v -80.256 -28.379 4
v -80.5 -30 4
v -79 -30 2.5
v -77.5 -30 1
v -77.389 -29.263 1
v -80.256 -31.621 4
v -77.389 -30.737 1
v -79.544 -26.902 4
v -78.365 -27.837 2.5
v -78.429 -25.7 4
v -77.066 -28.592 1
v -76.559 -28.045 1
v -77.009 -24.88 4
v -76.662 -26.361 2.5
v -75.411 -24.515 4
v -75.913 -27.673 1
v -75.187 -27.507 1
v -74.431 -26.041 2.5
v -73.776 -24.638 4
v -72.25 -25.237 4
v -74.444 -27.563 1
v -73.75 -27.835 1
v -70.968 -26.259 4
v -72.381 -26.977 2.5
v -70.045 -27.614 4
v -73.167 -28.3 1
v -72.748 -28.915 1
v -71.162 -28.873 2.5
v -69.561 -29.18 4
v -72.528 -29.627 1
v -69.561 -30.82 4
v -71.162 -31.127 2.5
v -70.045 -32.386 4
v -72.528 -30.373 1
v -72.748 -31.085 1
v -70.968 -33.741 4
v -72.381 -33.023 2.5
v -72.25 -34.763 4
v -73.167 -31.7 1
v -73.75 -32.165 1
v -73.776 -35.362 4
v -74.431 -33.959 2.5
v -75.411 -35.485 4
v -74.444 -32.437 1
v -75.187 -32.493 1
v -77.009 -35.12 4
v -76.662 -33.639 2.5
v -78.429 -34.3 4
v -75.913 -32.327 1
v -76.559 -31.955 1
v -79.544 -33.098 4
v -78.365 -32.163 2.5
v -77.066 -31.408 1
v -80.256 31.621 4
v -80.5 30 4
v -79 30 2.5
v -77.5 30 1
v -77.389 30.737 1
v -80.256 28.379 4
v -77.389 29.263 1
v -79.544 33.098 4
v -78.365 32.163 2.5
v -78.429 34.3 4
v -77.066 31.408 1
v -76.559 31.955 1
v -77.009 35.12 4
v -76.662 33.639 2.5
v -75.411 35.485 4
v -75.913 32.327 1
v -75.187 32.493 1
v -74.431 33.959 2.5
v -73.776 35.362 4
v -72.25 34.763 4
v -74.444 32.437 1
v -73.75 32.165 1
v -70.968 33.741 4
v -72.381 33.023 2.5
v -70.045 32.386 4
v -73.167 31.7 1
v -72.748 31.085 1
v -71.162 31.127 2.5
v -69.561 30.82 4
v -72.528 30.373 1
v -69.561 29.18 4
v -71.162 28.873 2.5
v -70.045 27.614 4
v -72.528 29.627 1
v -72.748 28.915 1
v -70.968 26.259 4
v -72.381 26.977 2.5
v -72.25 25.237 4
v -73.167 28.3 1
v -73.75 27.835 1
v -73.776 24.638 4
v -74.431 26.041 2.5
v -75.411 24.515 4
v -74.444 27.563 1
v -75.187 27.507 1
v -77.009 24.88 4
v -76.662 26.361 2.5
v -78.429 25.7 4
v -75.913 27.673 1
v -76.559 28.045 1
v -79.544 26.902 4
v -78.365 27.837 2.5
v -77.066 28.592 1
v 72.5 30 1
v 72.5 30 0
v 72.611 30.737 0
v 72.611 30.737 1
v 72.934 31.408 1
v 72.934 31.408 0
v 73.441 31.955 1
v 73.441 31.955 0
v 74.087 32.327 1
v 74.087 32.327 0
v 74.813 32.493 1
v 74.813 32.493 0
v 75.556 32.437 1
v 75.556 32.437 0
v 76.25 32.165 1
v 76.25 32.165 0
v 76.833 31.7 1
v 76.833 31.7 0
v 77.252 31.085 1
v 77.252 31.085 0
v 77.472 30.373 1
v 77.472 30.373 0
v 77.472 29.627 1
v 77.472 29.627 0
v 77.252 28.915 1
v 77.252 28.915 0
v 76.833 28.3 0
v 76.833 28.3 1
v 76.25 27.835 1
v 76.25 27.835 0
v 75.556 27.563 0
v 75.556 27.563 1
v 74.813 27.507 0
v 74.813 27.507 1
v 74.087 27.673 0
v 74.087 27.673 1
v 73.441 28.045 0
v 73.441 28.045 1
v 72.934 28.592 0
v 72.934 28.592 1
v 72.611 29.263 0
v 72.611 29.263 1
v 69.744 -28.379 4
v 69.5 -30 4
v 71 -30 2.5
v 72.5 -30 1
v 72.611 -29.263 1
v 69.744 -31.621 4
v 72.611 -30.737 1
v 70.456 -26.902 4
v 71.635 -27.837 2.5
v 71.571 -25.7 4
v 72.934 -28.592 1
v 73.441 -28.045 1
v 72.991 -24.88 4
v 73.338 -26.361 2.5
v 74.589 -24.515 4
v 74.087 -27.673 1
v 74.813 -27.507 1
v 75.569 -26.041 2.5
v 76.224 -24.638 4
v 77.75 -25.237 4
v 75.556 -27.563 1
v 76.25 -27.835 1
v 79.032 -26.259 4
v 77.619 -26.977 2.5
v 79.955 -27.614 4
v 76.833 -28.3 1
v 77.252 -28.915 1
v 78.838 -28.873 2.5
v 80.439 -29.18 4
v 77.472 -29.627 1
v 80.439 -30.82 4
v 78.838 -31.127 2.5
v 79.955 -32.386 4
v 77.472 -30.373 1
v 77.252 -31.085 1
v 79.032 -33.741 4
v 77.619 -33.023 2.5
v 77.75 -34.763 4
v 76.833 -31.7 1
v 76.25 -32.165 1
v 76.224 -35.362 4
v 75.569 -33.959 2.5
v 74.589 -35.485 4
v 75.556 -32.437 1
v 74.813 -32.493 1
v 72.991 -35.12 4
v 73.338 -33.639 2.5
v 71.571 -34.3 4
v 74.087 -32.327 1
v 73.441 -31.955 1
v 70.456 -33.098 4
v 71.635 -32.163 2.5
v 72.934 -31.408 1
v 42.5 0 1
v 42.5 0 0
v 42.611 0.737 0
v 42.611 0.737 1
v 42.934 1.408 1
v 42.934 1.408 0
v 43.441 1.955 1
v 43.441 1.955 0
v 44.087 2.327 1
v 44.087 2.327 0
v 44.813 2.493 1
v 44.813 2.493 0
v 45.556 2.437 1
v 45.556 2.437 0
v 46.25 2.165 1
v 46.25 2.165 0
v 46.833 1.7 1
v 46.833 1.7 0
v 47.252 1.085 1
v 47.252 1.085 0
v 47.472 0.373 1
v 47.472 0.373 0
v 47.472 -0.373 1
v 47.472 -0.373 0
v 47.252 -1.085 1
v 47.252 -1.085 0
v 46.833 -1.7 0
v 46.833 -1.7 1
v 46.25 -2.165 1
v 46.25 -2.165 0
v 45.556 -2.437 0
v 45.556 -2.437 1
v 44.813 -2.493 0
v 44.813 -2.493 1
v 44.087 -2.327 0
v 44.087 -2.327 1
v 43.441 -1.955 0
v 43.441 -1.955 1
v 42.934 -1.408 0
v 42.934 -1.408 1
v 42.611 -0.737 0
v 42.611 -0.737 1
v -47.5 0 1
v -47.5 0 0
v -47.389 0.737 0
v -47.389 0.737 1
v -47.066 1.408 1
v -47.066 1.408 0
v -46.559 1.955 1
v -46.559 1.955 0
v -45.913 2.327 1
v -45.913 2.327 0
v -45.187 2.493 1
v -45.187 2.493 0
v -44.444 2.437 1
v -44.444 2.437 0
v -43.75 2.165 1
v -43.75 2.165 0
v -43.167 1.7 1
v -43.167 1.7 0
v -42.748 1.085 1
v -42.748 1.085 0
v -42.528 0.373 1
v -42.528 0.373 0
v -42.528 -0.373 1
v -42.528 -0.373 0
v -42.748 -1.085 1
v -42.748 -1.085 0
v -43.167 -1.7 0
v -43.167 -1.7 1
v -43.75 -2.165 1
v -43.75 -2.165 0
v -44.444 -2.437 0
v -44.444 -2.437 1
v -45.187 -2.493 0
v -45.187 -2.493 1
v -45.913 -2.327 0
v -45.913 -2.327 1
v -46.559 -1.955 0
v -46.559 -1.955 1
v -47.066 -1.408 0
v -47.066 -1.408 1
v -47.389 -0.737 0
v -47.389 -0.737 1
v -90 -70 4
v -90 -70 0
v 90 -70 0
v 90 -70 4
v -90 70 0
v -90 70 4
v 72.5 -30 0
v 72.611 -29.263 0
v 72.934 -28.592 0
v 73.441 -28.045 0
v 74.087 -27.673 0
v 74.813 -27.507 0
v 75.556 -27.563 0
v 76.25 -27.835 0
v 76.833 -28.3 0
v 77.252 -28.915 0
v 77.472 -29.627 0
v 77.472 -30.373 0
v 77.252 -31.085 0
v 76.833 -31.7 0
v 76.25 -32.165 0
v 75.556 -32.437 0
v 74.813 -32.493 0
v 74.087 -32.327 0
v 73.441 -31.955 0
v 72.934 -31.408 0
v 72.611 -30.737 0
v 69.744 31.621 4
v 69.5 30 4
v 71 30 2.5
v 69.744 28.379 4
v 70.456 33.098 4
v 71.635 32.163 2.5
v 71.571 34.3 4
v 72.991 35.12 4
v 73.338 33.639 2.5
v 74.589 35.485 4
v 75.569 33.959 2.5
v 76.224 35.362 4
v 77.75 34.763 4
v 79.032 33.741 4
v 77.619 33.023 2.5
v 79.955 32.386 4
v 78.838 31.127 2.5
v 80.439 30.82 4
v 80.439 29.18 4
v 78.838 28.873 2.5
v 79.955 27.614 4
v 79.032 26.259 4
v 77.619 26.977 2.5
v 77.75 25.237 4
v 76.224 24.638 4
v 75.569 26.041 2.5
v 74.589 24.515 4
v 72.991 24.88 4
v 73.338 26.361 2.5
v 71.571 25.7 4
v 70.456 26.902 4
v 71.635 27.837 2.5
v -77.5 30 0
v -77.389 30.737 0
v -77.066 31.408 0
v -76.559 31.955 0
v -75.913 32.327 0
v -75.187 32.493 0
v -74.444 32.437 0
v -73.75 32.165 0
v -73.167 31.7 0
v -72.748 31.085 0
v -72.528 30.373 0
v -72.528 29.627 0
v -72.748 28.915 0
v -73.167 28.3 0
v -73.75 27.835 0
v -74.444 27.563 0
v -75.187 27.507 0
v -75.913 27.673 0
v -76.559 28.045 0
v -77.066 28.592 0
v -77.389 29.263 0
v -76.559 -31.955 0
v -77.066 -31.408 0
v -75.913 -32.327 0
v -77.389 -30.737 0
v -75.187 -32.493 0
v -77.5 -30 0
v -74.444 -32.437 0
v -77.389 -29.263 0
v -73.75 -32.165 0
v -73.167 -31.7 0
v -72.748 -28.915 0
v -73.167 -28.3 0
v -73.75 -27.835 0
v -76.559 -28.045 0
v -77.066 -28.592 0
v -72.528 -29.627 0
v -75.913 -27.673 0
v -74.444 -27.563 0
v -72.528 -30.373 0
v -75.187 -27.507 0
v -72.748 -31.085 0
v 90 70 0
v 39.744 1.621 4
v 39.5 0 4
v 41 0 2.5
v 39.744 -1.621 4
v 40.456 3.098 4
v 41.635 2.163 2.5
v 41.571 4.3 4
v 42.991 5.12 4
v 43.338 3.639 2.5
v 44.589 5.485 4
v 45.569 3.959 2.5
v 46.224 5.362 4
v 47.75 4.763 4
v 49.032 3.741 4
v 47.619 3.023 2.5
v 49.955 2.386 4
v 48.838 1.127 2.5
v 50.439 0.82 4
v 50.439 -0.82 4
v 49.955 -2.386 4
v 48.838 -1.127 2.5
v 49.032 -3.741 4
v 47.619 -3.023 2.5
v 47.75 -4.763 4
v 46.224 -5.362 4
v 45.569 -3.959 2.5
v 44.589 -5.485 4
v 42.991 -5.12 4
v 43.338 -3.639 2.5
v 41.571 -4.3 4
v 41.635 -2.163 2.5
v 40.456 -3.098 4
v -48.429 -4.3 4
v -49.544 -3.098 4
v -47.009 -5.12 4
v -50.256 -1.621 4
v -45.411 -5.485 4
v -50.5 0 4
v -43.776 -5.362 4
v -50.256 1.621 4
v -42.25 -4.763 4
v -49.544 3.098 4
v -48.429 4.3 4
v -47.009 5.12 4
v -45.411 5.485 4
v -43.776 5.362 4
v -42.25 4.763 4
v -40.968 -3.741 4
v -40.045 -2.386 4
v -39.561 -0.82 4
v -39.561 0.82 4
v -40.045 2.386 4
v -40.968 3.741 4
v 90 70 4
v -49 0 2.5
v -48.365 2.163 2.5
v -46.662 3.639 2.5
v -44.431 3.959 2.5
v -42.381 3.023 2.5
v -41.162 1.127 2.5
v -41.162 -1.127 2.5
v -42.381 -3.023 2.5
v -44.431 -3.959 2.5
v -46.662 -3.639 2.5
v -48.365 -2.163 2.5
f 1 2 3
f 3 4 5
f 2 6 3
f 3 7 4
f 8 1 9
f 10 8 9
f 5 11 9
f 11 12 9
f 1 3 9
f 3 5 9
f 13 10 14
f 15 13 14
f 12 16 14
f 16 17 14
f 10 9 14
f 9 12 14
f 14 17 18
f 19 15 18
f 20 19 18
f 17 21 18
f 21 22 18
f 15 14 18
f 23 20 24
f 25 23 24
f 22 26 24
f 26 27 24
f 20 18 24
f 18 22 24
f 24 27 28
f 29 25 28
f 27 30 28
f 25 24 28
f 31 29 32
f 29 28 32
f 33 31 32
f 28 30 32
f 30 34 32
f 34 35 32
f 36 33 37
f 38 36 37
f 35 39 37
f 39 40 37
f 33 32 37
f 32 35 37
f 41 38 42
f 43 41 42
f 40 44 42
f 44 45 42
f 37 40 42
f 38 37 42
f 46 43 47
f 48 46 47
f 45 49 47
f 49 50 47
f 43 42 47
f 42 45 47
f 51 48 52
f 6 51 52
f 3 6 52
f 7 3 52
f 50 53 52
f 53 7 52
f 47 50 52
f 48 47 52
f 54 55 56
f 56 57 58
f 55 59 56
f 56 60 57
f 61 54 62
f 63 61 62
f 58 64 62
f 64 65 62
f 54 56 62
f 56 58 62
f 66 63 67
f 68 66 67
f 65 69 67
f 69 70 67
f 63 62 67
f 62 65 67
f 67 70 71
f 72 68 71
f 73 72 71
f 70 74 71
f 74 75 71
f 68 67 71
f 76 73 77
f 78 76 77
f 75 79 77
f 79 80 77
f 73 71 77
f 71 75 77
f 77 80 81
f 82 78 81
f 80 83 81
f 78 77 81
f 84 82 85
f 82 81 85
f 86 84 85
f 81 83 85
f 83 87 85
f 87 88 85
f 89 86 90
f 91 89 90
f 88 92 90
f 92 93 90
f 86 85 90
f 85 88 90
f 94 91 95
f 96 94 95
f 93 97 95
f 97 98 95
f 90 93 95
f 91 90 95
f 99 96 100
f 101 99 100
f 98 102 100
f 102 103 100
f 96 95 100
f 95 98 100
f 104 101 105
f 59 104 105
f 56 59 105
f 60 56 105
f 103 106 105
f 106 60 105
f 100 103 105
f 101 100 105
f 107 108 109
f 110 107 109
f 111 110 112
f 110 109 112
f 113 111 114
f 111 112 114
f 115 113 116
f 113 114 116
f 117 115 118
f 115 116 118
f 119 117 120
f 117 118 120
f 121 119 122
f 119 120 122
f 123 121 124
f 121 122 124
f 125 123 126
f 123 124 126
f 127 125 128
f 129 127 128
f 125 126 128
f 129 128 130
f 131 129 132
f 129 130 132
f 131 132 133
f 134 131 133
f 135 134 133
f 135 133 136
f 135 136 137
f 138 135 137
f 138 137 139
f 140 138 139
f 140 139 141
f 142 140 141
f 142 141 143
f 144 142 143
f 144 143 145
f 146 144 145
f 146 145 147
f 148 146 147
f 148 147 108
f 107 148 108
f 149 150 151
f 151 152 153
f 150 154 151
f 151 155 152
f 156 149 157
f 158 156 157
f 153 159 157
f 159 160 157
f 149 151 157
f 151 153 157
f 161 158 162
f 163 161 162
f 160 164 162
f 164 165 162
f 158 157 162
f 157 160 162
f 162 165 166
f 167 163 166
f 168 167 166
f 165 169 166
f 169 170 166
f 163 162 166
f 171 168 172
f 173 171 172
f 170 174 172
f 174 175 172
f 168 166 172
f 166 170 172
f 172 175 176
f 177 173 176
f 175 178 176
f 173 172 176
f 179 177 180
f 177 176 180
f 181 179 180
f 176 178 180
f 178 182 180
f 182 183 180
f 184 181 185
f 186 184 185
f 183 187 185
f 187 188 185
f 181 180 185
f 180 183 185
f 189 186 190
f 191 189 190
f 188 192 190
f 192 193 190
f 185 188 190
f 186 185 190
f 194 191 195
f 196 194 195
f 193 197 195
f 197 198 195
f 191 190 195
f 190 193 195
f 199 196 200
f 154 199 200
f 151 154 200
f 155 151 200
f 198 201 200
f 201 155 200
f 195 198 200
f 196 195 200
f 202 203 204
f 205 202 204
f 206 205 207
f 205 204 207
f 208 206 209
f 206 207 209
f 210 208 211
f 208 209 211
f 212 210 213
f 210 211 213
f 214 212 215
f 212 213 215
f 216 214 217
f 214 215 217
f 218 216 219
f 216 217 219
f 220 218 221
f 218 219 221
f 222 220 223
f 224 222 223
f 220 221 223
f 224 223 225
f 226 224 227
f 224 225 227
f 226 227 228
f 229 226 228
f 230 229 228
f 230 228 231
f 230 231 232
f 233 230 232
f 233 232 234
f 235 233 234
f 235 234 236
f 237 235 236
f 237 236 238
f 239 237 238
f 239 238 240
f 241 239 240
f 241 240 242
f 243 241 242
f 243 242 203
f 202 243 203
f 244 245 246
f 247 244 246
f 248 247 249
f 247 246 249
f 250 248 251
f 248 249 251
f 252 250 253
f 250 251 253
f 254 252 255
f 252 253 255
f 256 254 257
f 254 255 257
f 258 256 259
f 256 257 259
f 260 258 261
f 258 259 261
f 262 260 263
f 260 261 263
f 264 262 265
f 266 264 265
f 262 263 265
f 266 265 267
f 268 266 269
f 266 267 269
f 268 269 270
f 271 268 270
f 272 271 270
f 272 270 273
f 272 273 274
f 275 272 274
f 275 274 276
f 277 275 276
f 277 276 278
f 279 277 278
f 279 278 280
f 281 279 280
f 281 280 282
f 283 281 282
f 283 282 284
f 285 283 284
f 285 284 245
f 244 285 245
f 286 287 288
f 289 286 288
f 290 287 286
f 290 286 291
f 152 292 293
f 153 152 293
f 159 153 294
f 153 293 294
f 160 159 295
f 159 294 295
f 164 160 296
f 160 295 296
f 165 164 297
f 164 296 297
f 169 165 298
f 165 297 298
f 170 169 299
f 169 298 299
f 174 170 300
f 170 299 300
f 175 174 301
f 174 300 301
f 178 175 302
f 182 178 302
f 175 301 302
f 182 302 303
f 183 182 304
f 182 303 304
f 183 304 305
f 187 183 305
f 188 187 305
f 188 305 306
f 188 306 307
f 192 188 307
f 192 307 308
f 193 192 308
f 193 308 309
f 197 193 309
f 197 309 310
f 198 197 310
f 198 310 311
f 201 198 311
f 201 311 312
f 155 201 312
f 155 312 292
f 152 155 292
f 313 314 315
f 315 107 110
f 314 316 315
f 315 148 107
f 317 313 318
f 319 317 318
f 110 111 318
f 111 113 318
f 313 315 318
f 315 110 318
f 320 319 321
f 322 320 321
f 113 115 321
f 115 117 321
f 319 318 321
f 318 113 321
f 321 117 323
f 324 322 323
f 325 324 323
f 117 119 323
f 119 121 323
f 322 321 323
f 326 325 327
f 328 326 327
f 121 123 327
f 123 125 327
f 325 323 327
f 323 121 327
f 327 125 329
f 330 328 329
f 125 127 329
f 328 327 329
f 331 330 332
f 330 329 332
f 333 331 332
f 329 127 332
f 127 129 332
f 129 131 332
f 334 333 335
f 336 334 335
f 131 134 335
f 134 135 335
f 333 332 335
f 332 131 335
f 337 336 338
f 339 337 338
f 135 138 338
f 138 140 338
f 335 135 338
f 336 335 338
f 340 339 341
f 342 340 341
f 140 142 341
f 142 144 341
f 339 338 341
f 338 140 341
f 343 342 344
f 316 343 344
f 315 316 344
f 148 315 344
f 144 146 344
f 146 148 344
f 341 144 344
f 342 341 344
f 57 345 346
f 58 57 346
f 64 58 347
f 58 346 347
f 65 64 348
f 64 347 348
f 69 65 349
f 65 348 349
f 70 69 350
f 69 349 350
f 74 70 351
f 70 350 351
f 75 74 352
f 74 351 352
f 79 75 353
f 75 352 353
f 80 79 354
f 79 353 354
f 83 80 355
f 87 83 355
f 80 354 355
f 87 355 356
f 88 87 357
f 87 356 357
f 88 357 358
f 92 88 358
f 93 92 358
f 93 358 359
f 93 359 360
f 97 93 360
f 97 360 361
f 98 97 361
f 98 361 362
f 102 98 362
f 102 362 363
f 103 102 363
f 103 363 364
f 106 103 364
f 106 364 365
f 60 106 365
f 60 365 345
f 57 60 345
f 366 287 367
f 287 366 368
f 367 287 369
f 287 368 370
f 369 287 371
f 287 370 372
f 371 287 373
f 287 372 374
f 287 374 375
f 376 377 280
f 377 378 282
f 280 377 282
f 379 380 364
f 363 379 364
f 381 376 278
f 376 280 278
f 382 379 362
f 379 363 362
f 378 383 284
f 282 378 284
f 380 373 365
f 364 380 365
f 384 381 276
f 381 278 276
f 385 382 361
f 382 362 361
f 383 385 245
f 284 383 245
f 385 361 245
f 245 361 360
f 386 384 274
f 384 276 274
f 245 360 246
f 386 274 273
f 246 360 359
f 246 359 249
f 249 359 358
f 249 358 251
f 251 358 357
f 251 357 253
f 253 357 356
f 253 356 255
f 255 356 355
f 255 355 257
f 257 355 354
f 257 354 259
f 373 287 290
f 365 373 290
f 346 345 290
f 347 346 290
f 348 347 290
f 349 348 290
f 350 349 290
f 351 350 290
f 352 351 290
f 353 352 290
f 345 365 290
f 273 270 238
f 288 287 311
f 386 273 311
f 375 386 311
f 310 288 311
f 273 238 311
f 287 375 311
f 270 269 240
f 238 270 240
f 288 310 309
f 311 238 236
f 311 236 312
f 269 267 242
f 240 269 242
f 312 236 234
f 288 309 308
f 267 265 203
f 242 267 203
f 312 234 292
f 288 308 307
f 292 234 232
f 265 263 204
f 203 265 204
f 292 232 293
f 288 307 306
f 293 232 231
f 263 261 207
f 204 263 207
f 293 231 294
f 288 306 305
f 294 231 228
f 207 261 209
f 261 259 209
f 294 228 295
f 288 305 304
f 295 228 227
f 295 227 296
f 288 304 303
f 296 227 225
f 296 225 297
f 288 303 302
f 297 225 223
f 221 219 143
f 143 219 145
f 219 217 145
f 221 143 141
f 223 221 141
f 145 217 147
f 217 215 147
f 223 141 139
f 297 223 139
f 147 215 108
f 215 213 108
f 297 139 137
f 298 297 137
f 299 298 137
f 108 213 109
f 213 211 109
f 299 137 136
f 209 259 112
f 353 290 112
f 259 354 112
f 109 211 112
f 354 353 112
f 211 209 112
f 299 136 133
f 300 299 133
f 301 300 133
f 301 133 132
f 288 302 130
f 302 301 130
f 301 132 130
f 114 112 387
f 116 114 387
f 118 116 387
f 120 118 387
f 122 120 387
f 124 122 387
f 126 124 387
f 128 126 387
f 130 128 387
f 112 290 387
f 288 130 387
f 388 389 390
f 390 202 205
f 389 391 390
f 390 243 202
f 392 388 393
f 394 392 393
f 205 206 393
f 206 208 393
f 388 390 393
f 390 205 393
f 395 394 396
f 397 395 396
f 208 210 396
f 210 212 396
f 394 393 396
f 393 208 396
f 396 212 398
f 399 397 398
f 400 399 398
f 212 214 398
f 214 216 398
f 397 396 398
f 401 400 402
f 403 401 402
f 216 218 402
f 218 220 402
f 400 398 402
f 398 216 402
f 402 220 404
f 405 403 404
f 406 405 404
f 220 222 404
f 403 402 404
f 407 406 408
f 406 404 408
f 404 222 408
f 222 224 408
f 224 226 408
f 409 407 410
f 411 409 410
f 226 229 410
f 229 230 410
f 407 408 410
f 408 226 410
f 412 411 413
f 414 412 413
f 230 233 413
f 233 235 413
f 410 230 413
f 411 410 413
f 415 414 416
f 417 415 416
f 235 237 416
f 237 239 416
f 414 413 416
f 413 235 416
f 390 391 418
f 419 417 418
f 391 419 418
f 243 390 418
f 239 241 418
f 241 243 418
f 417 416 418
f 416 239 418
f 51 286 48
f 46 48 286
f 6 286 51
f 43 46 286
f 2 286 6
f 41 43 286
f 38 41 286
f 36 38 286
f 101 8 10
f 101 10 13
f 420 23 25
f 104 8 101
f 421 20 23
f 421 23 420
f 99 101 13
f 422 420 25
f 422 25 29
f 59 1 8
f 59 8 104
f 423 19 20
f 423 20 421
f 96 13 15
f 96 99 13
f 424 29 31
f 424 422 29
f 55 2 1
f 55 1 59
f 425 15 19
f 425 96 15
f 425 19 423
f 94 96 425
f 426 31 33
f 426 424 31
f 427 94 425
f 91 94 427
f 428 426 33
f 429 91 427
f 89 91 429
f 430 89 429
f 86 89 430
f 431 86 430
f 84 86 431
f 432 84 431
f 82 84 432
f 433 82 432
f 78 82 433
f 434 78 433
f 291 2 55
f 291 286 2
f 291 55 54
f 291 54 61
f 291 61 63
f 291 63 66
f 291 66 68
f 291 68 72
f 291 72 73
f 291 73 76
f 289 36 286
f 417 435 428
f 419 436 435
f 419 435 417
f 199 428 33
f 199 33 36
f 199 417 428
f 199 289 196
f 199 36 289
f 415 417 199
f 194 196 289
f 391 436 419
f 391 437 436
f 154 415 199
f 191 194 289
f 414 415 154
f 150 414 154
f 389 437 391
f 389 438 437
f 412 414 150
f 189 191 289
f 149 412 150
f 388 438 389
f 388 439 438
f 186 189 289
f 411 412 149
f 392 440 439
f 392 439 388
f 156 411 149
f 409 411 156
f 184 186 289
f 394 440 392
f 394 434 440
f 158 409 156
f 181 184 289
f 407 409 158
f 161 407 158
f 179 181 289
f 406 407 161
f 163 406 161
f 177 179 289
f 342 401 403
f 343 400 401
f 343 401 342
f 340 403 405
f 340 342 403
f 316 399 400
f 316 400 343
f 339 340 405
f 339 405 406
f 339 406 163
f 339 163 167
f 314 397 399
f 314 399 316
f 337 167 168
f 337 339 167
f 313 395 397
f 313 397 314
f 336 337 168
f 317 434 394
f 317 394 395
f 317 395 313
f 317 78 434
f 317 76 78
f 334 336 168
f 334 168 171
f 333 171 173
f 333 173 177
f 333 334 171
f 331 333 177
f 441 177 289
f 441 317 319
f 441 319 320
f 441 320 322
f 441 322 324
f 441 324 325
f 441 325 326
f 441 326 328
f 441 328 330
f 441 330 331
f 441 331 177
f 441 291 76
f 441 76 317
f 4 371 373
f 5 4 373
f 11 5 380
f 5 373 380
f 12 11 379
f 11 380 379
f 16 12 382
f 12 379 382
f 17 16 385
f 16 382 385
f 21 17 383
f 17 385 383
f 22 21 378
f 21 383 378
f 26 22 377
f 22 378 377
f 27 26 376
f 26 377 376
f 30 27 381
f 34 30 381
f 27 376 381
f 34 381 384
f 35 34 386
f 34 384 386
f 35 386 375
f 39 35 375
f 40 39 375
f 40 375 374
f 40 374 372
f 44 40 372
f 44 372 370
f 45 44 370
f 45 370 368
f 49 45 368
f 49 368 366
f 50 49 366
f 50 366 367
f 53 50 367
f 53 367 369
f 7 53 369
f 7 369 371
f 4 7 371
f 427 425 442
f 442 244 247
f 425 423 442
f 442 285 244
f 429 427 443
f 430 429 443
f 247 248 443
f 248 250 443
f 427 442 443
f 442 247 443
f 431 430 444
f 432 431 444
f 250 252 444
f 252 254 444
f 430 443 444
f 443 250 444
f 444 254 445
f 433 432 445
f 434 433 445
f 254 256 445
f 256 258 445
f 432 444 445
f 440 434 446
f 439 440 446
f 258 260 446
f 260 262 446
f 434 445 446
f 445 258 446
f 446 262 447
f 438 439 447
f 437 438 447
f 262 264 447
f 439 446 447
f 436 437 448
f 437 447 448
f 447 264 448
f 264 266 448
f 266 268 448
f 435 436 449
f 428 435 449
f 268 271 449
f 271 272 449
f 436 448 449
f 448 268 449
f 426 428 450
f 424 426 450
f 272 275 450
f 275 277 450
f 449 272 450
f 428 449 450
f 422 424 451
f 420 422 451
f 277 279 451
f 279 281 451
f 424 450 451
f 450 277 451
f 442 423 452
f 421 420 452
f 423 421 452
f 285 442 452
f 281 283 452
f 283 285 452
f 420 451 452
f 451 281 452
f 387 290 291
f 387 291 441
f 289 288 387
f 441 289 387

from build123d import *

# Parameters (mm, degrees)
SKETCH1_W           = 180
SKETCH1_H           = 140
BOSS_EXTRUDE1_DEPTH = 4
CUT_EXTRUDE1_REACH  = 116.088
SKETCH2_R           = 2.5
CHAMFER1_SIZE       = 3


with BuildPart() as part:
    # Sketch1 → Boss-Extrude1 (new body)
    with BuildSketch(Plane.XY):
        Rectangle(SKETCH1_W, SKETCH1_H)
    extrude(amount=BOSS_EXTRUDE1_DEPTH)

    # Sketch2 → Cut-Extrude1 (cut, up to next)
    with BuildSketch(Plane(origin=(0, 0, 0), x_dir=(-1, 0, 0), z_dir=(0, 0, -1)), mode=Mode.PRIVATE) as cut_extrude1_sk1:
        with Locations((-75, 30)):
            Circle(SKETCH2_R)
    cut_extrude1_tool1 = extrude(cut_extrude1_sk1.sketch, amount=-CUT_EXTRUDE1_REACH, mode=Mode.PRIVATE) & part.part
    # Sketch2 → Cut-Extrude1 (cut, up to next)
    with BuildSketch(Plane(origin=(0, 0, 0), x_dir=(-1, 0, 0), z_dir=(0, 0, -1)), mode=Mode.PRIVATE) as cut_extrude1_sk2:
        with Locations((-75, -30)):
            Circle(SKETCH2_R)
    cut_extrude1_tool2 = extrude(cut_extrude1_sk2.sketch, amount=-CUT_EXTRUDE1_REACH, mode=Mode.PRIVATE) & part.part
    # Sketch2 → Cut-Extrude1 (cut, up to next)
    with BuildSketch(Plane(origin=(0, 0, 0), x_dir=(-1, 0, 0), z_dir=(0, 0, -1)), mode=Mode.PRIVATE) as cut_extrude1_sk3:
        with Locations((75, -30)):
            Circle(SKETCH2_R)
    cut_extrude1_tool3 = extrude(cut_extrude1_sk3.sketch, amount=-CUT_EXTRUDE1_REACH, mode=Mode.PRIVATE) & part.part
    # Sketch2 → Cut-Extrude1 (cut, up to next)
    with BuildSketch(Plane(origin=(0, 0, 0), x_dir=(-1, 0, 0), z_dir=(0, 0, -1)), mode=Mode.PRIVATE) as cut_extrude1_sk4:
        with Locations((75, 30)):
            Circle(SKETCH2_R)
    cut_extrude1_tool4 = extrude(cut_extrude1_sk4.sketch, amount=-CUT_EXTRUDE1_REACH, mode=Mode.PRIVATE) & part.part
    # Sketch2 → Cut-Extrude1 (cut, up to next)
    with BuildSketch(Plane(origin=(0, 0, 0), x_dir=(-1, 0, 0), z_dir=(0, 0, -1)), mode=Mode.PRIVATE) as cut_extrude1_sk5:
        with Locations((45, 0)):
            Circle(SKETCH2_R)
    cut_extrude1_tool5 = extrude(cut_extrude1_sk5.sketch, amount=-CUT_EXTRUDE1_REACH, mode=Mode.PRIVATE) & part.part
    # Sketch2 → Cut-Extrude1 (cut, up to next)
    with BuildSketch(Plane(origin=(0, 0, 0), x_dir=(-1, 0, 0), z_dir=(0, 0, -1)), mode=Mode.PRIVATE) as cut_extrude1_sk6:
        with Locations((-45, 0)):
            Circle(SKETCH2_R)
    cut_extrude1_tool6 = extrude(cut_extrude1_sk6.sketch, amount=-CUT_EXTRUDE1_REACH, mode=Mode.PRIVATE) & part.part
    add(cut_extrude1_tool1.solids().sort_by_distance((75, 30, 0))[0], mode=Mode.SUBTRACT)
    add(cut_extrude1_tool2.solids().sort_by_distance((75, -30, 0))[0], mode=Mode.SUBTRACT)
    add(cut_extrude1_tool3.solids().sort_by_distance((-75, -30, 0))[0], mode=Mode.SUBTRACT)
    add(cut_extrude1_tool4.solids().sort_by_distance((-75, 30, 0))[0], mode=Mode.SUBTRACT)
    add(cut_extrude1_tool5.solids().sort_by_distance((-45, 0, 0))[0], mode=Mode.SUBTRACT)
    add(cut_extrude1_tool6.solids().sort_by_distance((45, 0, 0))[0], mode=Mode.SUBTRACT)

    # Chamfer1
    chamfer1_edges = [part.edges().sort_by_distance(p)[0] for p in [
        (77.5, 30, 4),
        (77.5, -30, 4),
        (-72.5, -30, 4),
        (-72.5, 30, 4),
        (-42.5, 0, 4),
        (47.5, 0, 4),
    ]]
    chamfer(chamfer1_edges, length=CHAMFER1_SIZE)


solid = part.part
